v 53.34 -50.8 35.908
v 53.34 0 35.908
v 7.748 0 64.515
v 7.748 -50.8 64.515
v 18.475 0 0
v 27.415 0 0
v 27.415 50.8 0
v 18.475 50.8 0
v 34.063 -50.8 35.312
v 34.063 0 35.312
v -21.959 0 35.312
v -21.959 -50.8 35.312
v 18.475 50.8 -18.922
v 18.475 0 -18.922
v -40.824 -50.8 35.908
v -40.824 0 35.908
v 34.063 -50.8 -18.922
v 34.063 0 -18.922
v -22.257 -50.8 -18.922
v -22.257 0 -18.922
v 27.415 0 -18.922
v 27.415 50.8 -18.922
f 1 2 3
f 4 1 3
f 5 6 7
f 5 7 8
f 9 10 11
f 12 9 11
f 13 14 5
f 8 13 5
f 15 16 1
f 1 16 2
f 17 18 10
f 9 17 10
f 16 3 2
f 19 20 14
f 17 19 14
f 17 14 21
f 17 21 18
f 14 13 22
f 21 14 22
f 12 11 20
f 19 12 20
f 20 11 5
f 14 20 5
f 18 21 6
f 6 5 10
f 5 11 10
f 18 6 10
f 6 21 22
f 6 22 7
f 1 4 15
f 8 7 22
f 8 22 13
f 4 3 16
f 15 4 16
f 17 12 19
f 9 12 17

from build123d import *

# Parameters (mm, degrees)
F1_DEPTH = 50.8
F3_DEPTH = 50.8
F4_W     = 8.939667
F4_H     = 18.922292
F5_DEPTH = 50.8


with BuildPart() as f1:
    # F0 (on Front) → F1 (new body)
    with BuildSketch(Plane.XZ):
        Polygon((34.062963, 35.311677), (-21.958938, 35.311677), (-22.256928, -18.922292), (34.062963, -18.922292), align=None)
    extrude(amount=F1_DEPTH)

    # F4 (on face) → F5 (join)
    with BuildSketch(Plane(origin=(0, 0, 0), x_dir=(-1, 0, 0), z_dir=(0, 1, 0))):
        with Locations((-22.945141, -9.461146)):
            Rectangle(F4_W, F4_H)
    extrude(amount=F5_DEPTH)


with BuildPart() as f3:
    # F2 (on Front) → F3 (new body)
    with BuildSketch(Plane.XZ):
        Polygon((7.747712, 64.514577), (-40.824469, 35.907652), (53.339999, 35.907652), align=None)
    extrude(amount=F3_DEPTH)


solid = Compound([f1.part, f3.part])
